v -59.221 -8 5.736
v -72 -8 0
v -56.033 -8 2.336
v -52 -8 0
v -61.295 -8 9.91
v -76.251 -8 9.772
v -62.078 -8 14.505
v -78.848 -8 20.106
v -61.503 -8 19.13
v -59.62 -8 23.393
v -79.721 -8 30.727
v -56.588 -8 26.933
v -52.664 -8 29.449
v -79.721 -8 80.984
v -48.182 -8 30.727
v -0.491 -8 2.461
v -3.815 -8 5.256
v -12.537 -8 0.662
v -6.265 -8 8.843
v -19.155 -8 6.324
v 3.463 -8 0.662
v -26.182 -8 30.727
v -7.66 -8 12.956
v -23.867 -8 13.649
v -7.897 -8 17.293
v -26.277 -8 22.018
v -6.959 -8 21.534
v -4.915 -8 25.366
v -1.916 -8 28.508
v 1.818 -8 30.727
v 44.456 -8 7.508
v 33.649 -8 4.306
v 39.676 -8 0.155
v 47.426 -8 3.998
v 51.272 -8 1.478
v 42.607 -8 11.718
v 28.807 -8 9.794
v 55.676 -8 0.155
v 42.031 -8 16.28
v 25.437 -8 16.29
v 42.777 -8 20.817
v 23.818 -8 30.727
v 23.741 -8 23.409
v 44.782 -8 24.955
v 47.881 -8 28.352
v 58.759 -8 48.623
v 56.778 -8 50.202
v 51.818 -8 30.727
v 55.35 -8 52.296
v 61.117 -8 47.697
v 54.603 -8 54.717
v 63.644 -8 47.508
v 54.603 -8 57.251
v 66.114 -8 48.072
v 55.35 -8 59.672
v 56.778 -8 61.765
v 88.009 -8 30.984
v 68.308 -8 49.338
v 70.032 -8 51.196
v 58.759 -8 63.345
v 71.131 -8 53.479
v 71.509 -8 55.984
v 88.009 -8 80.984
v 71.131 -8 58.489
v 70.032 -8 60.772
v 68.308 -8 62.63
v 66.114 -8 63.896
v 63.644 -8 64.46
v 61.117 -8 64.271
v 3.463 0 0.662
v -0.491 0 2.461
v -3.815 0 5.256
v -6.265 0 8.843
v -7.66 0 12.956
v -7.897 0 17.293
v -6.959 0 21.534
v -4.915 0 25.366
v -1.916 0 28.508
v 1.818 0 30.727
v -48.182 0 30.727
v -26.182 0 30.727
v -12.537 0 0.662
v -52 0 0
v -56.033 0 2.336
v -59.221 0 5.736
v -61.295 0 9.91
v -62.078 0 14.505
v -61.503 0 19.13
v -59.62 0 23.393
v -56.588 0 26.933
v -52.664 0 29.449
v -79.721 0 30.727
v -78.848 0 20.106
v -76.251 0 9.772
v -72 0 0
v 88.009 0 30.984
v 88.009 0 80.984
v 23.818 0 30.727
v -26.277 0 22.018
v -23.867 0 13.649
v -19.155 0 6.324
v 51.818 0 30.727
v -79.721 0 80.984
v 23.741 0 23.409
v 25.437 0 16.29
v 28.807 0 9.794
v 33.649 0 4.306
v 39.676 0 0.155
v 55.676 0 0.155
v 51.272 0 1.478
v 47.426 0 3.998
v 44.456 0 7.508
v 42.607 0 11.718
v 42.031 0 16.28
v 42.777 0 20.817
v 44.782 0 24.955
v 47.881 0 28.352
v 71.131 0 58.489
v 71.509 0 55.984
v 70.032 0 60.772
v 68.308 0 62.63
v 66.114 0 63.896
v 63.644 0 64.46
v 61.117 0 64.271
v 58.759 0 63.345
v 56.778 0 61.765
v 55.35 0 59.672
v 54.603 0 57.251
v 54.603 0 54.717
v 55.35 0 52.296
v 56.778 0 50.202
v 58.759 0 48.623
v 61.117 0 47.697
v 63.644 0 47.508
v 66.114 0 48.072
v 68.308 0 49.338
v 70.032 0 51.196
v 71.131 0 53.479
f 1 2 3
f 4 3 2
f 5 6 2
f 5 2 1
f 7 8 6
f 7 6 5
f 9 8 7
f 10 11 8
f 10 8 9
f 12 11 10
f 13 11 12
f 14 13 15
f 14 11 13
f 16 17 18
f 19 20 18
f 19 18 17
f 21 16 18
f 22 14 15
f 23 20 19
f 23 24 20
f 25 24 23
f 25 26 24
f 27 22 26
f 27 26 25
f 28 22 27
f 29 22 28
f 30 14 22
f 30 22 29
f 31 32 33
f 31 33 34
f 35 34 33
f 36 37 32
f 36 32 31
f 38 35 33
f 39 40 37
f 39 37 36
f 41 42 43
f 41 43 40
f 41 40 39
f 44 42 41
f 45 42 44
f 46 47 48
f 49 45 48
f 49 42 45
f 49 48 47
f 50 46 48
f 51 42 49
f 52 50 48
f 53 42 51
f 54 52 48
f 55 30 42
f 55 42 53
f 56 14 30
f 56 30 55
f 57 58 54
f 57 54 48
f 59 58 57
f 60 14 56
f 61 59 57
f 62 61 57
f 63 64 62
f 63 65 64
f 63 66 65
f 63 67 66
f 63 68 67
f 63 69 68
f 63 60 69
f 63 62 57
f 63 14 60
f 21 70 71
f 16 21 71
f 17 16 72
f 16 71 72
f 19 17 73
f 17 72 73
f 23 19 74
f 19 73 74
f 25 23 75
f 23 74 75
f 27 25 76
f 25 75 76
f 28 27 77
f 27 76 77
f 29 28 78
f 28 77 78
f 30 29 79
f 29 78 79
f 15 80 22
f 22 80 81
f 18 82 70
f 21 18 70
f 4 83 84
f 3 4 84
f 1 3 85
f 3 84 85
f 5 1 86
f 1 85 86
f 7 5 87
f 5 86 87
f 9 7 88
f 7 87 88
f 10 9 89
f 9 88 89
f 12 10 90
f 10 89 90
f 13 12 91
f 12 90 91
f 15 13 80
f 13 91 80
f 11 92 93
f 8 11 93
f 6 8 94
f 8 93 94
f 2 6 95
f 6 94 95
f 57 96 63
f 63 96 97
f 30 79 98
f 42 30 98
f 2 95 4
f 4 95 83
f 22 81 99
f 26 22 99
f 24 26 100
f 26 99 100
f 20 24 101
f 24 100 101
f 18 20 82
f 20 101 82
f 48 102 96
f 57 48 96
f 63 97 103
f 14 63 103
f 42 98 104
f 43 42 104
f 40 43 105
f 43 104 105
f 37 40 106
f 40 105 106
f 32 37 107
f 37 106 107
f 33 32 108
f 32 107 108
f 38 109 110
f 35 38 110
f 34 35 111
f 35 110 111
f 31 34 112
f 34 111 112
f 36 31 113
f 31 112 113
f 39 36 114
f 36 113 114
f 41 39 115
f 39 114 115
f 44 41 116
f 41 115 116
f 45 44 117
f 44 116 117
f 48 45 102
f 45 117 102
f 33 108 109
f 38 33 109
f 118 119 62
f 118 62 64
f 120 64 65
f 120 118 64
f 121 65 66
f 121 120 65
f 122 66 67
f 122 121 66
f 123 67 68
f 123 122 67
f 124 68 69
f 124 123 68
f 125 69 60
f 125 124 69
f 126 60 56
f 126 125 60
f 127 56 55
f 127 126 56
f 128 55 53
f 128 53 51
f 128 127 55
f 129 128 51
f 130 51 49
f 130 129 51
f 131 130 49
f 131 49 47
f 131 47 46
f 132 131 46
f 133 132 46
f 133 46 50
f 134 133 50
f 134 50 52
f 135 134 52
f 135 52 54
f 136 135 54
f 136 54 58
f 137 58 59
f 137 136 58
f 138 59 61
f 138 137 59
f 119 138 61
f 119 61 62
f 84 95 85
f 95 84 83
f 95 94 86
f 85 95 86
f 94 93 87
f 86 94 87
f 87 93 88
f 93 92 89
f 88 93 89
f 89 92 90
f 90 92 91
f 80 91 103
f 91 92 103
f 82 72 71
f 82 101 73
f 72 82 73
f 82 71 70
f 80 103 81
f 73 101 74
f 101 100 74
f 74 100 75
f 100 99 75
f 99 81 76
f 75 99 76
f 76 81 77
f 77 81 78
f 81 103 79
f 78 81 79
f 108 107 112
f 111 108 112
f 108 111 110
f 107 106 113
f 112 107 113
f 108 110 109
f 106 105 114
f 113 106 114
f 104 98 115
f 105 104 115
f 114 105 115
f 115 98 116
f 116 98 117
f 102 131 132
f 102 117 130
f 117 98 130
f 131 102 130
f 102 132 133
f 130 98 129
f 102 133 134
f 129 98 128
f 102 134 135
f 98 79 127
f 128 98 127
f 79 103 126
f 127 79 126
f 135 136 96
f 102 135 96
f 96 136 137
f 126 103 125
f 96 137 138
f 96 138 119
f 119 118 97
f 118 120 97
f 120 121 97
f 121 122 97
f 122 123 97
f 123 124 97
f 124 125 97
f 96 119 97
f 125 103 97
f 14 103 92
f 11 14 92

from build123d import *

# Parameters (mm, degrees)
F0_R     = 8.5
F1_DEPTH = 8


with BuildPart() as f1:
    # F0 (on Front) → F1 (new body)
    with BuildSketch(Plane.XZ):
        with BuildLine():
            Line((88.008557, 80.983967), (-79.72115, 80.983967))
            Line((-79.72115, 80.983967), (-79.72115, 30.726752))
            ThreePointArc((-79.72115, 30.726752), (-77.761317, 14.88575), (-72, 0))
            Line((-72, 0), (-52, 0))
            ThreePointArc((-52, 0), (-61.959604, 16.838163), (-48.181921, 30.726752))
            Line((-48.181921, 30.726752), (-26.181921, 30.726752))
            ThreePointArc((-26.181921, 30.726752), (-23.867446, 13.648604), (-12.537347, 0.662117))
            Line((-12.537347, 0.662117), (3.462653, 0.662117))
            ThreePointArc((3.462653, 0.662117), (-7.925971, 15.116443), (1.818079, 30.726752))
            Line((1.818079, 30.726752), (23.818079, 30.726752))
            ThreePointArc((23.818079, 30.726752), (26.923148, 12.938641), (39.676101, 0.155035))
            Line((39.676101, 0.155035), (55.676101, 0.155035))
            ThreePointArc((55.676101, 0.155035), (42.154292, 13.977932), (51.818079, 30.726752))
            Line((51.818079, 30.726752), (88.008557, 30.983967))
            Line((88.008557, 30.983967), (88.008557, 80.983967))
        make_face()
        with Locations((63.008557, 55.983967)):
            Circle(F0_R, mode=Mode.SUBTRACT)
    extrude(amount=F1_DEPTH)


solid = f1.part
